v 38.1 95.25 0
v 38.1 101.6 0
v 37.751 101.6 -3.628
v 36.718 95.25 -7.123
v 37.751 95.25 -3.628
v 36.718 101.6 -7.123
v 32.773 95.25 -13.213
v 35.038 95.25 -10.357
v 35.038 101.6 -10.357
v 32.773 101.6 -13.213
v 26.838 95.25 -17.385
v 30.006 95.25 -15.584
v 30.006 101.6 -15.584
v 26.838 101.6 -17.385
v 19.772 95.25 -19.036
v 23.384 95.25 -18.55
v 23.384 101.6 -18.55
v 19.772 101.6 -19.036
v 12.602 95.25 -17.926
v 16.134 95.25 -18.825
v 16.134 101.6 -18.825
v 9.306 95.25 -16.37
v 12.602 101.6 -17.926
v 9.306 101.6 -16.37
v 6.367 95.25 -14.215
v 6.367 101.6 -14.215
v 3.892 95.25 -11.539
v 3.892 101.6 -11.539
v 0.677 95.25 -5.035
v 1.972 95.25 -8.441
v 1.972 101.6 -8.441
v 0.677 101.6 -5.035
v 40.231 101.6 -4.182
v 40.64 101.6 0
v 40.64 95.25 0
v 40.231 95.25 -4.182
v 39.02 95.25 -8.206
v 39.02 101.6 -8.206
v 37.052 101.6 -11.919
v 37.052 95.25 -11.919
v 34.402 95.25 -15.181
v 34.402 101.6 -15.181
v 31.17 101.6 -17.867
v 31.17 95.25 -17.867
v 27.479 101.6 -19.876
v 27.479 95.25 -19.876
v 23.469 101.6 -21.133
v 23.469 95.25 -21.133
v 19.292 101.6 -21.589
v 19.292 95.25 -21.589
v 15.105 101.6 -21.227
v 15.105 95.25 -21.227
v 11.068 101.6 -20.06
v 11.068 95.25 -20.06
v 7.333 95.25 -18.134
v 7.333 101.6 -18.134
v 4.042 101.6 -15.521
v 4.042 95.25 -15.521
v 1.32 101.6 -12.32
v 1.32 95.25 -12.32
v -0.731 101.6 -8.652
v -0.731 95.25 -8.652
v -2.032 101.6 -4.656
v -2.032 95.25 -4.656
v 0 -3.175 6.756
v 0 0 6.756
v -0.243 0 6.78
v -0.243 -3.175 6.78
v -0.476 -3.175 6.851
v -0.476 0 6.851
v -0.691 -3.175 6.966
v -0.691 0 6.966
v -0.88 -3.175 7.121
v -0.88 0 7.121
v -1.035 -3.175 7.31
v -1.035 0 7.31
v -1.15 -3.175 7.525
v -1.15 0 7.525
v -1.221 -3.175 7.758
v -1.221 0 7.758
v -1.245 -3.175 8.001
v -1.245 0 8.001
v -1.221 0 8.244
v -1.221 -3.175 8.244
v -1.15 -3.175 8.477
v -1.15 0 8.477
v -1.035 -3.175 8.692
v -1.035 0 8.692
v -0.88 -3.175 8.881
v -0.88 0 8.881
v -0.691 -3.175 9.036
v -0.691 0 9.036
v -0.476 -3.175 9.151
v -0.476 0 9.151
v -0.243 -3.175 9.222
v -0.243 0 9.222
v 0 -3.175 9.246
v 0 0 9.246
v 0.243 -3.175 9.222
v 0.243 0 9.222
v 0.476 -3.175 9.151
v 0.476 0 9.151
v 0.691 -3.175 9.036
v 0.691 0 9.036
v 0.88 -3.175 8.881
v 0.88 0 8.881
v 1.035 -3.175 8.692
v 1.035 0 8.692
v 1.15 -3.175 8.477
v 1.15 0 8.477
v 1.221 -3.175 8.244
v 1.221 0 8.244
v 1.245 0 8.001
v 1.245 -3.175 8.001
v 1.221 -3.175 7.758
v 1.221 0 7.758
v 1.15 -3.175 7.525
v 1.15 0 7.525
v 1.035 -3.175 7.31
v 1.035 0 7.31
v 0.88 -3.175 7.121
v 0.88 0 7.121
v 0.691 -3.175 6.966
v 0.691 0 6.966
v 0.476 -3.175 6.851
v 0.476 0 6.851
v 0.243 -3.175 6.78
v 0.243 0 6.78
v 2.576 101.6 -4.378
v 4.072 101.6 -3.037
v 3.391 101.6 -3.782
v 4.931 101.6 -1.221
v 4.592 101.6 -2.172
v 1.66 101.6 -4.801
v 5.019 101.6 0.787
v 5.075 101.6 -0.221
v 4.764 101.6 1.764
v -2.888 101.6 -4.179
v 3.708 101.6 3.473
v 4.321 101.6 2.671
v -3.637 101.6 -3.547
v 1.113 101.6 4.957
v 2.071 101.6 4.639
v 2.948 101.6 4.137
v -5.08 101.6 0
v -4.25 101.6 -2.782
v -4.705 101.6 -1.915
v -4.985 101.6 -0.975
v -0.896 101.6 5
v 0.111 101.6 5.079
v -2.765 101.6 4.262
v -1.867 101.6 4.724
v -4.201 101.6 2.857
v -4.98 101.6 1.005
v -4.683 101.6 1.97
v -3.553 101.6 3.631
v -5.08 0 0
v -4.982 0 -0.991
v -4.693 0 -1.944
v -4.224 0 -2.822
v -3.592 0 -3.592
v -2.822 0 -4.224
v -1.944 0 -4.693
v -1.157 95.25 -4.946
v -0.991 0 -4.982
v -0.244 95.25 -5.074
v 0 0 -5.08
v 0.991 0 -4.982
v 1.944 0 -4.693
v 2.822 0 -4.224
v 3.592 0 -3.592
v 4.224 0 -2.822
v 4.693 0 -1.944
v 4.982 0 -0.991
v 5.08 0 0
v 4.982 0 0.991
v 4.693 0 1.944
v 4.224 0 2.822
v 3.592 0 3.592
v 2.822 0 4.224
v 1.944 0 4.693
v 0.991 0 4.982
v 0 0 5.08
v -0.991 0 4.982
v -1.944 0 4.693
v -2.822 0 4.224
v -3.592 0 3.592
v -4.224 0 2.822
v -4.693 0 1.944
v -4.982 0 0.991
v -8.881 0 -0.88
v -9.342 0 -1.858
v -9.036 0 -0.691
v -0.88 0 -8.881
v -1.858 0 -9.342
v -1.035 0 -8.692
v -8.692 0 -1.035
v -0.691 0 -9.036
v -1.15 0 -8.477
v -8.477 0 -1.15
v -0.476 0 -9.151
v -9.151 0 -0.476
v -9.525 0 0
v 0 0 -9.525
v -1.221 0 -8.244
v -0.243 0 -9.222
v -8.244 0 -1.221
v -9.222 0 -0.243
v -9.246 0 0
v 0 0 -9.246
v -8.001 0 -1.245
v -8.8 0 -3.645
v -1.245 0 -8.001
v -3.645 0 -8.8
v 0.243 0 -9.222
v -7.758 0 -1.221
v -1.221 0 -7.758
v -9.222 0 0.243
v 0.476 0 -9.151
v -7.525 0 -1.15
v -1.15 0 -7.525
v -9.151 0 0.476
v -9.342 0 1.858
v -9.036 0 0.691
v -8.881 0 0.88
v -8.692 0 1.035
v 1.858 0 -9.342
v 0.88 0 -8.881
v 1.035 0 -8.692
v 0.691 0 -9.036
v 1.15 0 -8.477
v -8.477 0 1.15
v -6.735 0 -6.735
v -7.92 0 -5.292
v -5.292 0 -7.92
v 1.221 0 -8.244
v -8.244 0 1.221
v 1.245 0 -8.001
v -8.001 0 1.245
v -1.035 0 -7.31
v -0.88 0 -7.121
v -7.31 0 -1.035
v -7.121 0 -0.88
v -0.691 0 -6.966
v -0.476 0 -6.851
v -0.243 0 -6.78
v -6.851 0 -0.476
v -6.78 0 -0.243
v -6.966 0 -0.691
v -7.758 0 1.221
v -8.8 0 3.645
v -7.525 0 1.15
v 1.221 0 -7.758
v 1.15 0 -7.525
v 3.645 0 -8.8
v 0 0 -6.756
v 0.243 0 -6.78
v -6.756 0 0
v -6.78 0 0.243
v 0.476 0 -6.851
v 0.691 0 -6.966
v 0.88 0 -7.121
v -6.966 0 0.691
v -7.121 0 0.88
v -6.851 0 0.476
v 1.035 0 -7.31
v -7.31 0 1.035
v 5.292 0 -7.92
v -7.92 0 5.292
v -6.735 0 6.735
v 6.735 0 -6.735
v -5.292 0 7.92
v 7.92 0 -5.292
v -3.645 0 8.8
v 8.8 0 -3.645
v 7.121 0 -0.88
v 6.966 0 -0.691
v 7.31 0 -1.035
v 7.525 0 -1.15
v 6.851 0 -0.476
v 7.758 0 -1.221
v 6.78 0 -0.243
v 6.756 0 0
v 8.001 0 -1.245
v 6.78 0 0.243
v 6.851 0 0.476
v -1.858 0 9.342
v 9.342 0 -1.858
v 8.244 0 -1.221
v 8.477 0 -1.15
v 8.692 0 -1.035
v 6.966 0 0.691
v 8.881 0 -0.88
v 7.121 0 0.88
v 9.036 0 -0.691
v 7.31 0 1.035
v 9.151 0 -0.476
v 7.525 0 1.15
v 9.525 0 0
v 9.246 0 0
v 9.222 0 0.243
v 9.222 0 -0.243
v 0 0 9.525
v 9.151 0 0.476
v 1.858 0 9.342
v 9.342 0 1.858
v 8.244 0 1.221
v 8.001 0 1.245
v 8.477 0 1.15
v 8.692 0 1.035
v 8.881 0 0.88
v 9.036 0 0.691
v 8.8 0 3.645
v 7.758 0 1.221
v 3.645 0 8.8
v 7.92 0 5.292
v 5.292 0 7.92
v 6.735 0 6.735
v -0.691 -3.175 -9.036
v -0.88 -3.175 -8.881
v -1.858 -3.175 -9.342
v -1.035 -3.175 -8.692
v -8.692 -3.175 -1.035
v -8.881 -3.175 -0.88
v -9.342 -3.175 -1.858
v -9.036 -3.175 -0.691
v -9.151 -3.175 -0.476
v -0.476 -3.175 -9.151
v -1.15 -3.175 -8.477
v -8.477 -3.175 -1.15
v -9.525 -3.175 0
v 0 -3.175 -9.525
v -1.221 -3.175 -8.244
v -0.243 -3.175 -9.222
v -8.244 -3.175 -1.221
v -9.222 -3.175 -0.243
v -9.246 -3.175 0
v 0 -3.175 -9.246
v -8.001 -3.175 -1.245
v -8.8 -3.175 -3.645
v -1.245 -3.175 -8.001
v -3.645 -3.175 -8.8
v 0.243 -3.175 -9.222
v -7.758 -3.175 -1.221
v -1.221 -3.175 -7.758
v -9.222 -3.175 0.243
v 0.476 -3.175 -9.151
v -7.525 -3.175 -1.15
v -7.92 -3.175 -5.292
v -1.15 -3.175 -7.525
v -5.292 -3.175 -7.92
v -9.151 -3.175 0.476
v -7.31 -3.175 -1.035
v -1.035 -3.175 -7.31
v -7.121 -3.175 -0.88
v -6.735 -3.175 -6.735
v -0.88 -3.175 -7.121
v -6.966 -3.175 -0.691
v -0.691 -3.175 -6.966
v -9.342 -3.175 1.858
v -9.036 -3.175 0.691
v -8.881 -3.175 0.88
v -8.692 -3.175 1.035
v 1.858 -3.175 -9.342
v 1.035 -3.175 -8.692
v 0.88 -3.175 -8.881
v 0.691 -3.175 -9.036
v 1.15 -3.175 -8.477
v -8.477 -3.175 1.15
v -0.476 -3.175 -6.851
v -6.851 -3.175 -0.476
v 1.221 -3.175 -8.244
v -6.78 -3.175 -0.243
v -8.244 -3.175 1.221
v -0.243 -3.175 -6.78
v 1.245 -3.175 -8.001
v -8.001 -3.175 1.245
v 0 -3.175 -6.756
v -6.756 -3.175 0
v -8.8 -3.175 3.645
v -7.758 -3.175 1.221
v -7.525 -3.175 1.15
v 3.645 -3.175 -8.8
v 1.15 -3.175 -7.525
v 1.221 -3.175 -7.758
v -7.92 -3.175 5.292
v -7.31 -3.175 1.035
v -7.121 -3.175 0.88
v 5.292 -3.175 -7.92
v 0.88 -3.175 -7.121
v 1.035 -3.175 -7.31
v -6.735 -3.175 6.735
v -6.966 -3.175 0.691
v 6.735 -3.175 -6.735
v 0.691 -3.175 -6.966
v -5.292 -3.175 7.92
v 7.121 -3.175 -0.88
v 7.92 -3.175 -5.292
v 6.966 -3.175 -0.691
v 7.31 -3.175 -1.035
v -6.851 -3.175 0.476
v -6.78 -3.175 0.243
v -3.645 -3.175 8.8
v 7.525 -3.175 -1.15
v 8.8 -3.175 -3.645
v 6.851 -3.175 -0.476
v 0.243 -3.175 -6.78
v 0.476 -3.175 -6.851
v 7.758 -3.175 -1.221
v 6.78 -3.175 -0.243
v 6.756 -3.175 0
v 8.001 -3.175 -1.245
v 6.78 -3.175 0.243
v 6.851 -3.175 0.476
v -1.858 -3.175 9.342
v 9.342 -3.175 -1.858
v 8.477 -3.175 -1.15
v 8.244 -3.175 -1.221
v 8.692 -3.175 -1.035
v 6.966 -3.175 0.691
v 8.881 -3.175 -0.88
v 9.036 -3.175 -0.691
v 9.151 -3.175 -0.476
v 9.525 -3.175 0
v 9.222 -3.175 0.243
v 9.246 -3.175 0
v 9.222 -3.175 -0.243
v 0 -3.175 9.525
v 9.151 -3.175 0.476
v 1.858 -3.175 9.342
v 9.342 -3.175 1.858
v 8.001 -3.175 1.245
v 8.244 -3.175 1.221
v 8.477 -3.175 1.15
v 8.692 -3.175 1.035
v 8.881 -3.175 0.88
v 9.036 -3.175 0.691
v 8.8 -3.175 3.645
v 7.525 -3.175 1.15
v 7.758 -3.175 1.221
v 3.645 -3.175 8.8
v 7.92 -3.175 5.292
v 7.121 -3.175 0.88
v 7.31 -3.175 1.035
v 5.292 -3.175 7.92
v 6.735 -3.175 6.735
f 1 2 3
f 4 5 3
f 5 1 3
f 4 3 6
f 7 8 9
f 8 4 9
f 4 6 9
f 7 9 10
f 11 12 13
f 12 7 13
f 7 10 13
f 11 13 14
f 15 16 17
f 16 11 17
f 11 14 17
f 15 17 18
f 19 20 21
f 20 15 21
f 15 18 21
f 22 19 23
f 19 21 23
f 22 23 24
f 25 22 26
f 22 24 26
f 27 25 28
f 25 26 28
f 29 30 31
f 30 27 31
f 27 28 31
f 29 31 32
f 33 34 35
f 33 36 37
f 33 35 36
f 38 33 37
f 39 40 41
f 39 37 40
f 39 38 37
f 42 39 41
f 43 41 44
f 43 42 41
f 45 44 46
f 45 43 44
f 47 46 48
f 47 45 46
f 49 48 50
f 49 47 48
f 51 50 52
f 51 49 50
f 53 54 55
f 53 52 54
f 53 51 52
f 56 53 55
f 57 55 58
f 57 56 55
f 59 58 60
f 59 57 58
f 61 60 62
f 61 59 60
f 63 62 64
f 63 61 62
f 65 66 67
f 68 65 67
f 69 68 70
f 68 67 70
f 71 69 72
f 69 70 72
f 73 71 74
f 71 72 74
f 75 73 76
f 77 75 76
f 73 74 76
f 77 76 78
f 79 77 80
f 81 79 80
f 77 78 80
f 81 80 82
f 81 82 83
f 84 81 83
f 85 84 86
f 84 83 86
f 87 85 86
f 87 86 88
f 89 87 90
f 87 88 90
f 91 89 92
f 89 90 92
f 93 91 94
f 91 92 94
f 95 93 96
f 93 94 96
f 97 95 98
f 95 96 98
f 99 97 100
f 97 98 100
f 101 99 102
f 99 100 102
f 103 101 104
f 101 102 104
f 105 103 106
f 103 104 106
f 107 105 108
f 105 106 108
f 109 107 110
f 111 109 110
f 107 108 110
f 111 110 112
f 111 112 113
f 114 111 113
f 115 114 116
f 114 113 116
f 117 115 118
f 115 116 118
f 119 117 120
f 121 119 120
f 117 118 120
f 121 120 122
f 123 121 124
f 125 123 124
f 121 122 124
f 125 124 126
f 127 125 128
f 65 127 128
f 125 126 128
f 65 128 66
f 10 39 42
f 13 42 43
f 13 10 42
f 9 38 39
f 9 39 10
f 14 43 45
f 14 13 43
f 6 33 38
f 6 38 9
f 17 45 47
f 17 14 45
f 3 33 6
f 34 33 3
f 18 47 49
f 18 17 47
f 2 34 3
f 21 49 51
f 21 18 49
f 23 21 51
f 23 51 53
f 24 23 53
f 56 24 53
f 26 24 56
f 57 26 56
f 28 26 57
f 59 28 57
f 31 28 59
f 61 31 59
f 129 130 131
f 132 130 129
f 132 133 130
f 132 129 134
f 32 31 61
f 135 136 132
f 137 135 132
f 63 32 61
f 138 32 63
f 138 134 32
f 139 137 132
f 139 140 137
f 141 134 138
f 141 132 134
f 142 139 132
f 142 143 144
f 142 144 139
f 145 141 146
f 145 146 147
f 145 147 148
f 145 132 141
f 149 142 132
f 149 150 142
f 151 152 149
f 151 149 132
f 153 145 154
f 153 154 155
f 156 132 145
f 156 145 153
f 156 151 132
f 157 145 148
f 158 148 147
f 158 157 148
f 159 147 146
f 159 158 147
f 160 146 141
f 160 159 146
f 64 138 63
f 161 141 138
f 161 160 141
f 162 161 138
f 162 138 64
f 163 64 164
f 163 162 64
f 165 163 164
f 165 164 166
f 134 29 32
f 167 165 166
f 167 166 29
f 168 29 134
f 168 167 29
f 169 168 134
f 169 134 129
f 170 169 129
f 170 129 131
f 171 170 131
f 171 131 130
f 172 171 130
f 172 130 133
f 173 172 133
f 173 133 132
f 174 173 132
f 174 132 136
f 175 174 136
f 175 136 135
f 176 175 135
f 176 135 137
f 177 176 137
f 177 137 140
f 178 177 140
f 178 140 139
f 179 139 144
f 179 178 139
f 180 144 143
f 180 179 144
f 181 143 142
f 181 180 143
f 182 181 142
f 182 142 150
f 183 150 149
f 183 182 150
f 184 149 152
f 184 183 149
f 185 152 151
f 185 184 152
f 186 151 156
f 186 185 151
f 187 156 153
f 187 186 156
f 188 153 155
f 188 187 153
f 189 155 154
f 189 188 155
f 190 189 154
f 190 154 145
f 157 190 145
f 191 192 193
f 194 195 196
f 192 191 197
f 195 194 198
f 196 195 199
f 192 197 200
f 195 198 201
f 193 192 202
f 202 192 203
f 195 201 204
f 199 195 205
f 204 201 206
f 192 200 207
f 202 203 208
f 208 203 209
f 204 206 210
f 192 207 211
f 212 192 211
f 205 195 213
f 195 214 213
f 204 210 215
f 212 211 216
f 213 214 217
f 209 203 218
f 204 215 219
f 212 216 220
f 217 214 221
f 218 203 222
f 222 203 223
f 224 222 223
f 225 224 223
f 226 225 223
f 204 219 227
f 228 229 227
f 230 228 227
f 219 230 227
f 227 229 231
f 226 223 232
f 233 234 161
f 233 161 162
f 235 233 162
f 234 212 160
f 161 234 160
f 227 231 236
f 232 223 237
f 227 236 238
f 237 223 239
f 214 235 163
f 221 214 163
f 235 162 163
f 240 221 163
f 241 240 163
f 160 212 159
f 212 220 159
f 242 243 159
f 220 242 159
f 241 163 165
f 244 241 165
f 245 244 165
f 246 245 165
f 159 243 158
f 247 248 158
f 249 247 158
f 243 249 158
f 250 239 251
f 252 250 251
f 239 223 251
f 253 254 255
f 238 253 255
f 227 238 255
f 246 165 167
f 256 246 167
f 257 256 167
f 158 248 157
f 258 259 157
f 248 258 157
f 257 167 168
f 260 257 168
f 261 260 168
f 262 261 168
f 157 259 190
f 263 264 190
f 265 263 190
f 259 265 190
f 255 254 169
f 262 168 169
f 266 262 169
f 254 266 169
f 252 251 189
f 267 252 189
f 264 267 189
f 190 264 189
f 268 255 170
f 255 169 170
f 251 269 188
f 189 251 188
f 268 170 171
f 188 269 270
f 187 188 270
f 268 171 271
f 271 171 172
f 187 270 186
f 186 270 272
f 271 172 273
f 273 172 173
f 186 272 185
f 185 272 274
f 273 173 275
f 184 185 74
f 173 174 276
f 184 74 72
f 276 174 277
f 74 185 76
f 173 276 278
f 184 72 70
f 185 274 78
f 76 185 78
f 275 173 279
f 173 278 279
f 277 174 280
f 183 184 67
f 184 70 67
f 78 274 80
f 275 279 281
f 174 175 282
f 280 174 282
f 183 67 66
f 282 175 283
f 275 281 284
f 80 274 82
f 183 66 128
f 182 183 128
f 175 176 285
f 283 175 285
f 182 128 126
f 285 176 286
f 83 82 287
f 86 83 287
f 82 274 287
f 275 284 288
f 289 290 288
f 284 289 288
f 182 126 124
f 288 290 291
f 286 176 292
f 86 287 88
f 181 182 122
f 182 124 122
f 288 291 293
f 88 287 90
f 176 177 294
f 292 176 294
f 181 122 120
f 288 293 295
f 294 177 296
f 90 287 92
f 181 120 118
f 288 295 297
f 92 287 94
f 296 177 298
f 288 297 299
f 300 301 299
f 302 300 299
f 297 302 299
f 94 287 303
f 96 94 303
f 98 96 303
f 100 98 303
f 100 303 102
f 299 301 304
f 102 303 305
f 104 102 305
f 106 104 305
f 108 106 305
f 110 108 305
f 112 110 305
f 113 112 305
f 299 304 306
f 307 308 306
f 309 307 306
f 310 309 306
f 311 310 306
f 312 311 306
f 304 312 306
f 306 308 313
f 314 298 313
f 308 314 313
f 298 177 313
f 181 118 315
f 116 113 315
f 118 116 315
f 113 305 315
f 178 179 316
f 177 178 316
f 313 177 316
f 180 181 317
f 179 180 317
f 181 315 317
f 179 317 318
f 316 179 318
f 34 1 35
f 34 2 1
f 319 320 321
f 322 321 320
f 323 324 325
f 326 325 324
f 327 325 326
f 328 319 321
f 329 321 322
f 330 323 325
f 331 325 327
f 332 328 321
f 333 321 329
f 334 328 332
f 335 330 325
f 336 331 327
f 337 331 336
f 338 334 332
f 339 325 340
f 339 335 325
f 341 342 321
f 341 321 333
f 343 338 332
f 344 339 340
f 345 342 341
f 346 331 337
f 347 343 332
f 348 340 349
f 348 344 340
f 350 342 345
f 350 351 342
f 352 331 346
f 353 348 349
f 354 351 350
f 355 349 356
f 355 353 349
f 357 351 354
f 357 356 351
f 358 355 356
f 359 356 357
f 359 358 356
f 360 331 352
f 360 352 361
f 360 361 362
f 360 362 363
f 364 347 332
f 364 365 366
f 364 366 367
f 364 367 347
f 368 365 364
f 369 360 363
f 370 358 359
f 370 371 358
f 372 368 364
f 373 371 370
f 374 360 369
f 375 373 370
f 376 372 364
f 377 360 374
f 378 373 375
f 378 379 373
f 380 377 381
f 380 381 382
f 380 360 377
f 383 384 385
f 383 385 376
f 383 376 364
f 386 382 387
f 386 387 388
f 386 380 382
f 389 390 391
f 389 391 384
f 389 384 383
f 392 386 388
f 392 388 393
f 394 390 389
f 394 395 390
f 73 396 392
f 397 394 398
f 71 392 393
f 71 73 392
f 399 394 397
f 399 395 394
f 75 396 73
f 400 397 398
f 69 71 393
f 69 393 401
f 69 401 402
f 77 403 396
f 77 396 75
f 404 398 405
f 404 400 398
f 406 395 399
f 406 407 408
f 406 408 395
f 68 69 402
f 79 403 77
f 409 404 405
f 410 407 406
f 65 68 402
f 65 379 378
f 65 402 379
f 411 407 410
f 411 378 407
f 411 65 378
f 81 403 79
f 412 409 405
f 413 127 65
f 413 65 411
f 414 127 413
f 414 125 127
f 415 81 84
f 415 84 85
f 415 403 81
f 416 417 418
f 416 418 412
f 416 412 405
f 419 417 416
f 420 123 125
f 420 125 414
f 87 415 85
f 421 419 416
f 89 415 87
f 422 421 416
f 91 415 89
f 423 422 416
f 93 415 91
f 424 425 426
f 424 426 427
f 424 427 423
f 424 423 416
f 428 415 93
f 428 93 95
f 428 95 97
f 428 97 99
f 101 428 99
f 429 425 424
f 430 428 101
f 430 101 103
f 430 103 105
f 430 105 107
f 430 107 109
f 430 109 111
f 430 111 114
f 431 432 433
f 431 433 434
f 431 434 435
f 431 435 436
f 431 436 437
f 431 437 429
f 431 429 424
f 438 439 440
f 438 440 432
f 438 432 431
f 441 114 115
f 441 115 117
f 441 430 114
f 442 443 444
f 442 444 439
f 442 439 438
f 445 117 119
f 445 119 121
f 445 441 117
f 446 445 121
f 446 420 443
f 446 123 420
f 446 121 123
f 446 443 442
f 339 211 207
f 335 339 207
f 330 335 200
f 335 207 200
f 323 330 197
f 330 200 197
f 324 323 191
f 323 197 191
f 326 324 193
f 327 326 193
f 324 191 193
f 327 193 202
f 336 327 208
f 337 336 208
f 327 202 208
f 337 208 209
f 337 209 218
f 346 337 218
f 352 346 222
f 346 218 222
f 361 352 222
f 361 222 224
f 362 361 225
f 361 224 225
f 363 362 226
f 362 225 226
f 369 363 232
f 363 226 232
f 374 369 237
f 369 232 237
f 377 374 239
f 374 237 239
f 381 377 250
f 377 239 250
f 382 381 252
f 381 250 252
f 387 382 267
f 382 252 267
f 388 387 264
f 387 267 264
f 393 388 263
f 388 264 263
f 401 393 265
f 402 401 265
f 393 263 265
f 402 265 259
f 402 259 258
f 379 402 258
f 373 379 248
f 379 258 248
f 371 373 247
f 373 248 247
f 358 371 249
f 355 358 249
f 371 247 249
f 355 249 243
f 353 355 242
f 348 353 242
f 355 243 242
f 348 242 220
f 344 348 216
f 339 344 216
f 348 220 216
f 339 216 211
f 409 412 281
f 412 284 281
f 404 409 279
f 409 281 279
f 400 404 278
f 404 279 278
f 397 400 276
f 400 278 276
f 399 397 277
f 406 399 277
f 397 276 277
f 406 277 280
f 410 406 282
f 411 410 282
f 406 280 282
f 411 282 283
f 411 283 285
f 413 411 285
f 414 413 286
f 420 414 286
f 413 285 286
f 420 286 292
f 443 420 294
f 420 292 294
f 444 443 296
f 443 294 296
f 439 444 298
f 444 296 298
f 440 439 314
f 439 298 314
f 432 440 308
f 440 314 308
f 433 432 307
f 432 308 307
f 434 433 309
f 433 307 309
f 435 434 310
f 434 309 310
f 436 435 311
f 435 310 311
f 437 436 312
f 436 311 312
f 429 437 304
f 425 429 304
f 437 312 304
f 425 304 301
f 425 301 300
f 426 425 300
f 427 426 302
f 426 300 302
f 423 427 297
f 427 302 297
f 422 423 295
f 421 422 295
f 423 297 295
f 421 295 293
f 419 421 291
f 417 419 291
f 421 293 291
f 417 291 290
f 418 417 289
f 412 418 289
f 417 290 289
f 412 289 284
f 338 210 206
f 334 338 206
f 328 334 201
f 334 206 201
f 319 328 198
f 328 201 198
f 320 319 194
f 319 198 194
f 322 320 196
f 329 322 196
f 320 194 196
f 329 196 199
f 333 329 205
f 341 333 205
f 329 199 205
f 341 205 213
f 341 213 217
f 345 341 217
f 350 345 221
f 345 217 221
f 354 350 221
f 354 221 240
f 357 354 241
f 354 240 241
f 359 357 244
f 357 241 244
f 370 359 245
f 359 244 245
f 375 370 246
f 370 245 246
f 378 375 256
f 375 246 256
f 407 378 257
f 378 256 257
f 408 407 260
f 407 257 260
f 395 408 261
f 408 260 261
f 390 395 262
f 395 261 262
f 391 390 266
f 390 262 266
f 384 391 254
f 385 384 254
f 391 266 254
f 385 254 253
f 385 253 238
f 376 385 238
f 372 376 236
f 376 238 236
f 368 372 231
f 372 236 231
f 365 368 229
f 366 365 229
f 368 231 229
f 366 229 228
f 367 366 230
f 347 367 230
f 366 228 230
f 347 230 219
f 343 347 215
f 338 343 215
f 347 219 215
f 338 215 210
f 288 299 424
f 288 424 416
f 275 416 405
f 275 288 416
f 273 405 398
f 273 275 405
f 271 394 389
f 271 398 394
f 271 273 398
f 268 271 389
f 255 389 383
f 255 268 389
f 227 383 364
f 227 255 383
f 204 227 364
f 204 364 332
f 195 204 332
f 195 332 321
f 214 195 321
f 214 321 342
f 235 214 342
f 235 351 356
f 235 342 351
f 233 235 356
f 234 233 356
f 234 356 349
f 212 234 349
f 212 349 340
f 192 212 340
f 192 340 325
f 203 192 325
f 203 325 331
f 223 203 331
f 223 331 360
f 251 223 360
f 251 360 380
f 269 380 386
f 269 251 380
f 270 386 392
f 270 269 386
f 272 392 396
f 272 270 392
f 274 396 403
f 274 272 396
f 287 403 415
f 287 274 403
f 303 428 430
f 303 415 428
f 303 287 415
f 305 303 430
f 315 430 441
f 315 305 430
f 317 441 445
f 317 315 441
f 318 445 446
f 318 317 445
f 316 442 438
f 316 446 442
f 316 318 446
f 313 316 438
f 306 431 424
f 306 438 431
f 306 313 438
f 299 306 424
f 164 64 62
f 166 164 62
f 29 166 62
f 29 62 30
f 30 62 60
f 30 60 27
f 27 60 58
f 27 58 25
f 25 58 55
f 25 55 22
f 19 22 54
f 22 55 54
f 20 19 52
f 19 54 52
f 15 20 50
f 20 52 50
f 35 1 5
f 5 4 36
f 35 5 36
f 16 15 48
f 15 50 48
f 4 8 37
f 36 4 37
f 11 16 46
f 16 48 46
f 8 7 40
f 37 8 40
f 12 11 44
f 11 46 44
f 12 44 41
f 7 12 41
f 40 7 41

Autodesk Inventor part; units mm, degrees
ref_plane "YZ Plane" through (0, 0, 0) normal (1, 0, 0) x (0, 1, 0)
ref_plane "XZ Plane" through (0, 0, 0) normal (0, 1, 0) x (-1, 0, 0)
ref_plane "XY Plane" through (0, 0, 0) normal (0, 0, 1) x (1, 0, 0)
sketch "Sketch1" plane through (0, 0, 0) normal (0, 1, 0) x (-1, 0, 0)
  circle A0 centre (0, 0) radius 5.08
  dimension "d0" = 10.16
extrude "Extrusion1" add sketch "Sketch1" along normal blind 101.6
sketch "Sketch2" plane through (0, 101.6, 0) normal (0, 1, 0) x (1, 0, 0)
  circle A0 centre (0, 0) radius 5.08 projected
  line L0 (0, 0) -> (-2.54, 0)
  line L1 (38.1, 0) -> (40.64, 0)
  arc A1 (38.1, 0) -> (0, 0) centre (19.05, 0) ccw
  arc A2 (40.64, 0) -> (-2.54, 0) centre (19.05, 0) ccw
  line L2 (38.1, 0) -> (40.64, 0) construction
  line L3 (5.08, 0) -> (-2.54, 0) construction
  line L4 (-2.54, 0) -> (5.08, 0)
  line L5 (38.1, 0) -> (40.64, 0)
  dimension "d64" = 2.54
  dimension "d65" = 2.54
  dimension "d66" = 38.1
  dimension "d67" = 19.05
  dimension "d68" = 180
  dimension "d69" = 21.59
extrude "Extrusion5" add sketch "Sketch2" against normal blind 6.35 contours A1 L0 A2 A0 | A0 A2 L1 A1
sketch "Sketch4" plane through (0, 0, 0) normal (0, -1, 0) x (1, 0, 0)
  circle A0 centre (0, 0) radius 9.525
  dimension "d72" = 19.05
extrude "Extrusion6" add sketch "Sketch4" along normal blind 3.175
sketch "Sketch5" plane through (0, -3.175, 0) normal (0, -1, 0) x (1, 0, 0)
  point P0 (0, 0)
  point P1 (0, 8.001)
  point P2 (0, -8.001)
  point P3 (8.001, 0)
  point P4 (-8.001, 0)
  dimension "d79" = 8.001
  dimension "d80" = 8.001
  dimension "d81" = 8.001
  dimension "d82" = 8.001
hole "Hole1" at (0, -3.175, 8.001) at (0, -3.175, -8.001) at (8.001, -3.175, 0) at (-8.001, -3.175, 0) direction (0, 1, 0) diameter 2.4892 depth 25.4 tip angle 118
ref_plane "Work Plane6" through (0, 66.675, 0) normal (0, 1, 0) x (1, 0, 0)
sketch "Sketch6" plane through (0, 66.675, 0) normal (0, 1, 0) x (1, 0, 0)
  line L0 (0, 0) -> (1.27, 0)
  line L1 (1.27, 0) -> (-1.27, 0)
  arc A0 (38.1, 0) -> (0.6773, 5.0346) centre (19.05, 0) ccw projected
  arc A1 (1.27, 0) -> (36.83, 0) centre (19.05, 0) ccw
  arc A2 (-1.27, 0) -> (39.37, 0) centre (19.05, 0) ccw
  line L2 (39.37, 0) -> (36.83, 0)
  line L3 (1.27, 0) -> (-1.27, 0)
  dimension "d91" = 1.27
  dimension "d92" = 2.54
equation "\"d67\" = 0.5 * d66"
equation "\"d80\" = d79"
equation "\"d81\" = d79"
equation "\"d82\" = d79"
properties part number "pincherleft"
